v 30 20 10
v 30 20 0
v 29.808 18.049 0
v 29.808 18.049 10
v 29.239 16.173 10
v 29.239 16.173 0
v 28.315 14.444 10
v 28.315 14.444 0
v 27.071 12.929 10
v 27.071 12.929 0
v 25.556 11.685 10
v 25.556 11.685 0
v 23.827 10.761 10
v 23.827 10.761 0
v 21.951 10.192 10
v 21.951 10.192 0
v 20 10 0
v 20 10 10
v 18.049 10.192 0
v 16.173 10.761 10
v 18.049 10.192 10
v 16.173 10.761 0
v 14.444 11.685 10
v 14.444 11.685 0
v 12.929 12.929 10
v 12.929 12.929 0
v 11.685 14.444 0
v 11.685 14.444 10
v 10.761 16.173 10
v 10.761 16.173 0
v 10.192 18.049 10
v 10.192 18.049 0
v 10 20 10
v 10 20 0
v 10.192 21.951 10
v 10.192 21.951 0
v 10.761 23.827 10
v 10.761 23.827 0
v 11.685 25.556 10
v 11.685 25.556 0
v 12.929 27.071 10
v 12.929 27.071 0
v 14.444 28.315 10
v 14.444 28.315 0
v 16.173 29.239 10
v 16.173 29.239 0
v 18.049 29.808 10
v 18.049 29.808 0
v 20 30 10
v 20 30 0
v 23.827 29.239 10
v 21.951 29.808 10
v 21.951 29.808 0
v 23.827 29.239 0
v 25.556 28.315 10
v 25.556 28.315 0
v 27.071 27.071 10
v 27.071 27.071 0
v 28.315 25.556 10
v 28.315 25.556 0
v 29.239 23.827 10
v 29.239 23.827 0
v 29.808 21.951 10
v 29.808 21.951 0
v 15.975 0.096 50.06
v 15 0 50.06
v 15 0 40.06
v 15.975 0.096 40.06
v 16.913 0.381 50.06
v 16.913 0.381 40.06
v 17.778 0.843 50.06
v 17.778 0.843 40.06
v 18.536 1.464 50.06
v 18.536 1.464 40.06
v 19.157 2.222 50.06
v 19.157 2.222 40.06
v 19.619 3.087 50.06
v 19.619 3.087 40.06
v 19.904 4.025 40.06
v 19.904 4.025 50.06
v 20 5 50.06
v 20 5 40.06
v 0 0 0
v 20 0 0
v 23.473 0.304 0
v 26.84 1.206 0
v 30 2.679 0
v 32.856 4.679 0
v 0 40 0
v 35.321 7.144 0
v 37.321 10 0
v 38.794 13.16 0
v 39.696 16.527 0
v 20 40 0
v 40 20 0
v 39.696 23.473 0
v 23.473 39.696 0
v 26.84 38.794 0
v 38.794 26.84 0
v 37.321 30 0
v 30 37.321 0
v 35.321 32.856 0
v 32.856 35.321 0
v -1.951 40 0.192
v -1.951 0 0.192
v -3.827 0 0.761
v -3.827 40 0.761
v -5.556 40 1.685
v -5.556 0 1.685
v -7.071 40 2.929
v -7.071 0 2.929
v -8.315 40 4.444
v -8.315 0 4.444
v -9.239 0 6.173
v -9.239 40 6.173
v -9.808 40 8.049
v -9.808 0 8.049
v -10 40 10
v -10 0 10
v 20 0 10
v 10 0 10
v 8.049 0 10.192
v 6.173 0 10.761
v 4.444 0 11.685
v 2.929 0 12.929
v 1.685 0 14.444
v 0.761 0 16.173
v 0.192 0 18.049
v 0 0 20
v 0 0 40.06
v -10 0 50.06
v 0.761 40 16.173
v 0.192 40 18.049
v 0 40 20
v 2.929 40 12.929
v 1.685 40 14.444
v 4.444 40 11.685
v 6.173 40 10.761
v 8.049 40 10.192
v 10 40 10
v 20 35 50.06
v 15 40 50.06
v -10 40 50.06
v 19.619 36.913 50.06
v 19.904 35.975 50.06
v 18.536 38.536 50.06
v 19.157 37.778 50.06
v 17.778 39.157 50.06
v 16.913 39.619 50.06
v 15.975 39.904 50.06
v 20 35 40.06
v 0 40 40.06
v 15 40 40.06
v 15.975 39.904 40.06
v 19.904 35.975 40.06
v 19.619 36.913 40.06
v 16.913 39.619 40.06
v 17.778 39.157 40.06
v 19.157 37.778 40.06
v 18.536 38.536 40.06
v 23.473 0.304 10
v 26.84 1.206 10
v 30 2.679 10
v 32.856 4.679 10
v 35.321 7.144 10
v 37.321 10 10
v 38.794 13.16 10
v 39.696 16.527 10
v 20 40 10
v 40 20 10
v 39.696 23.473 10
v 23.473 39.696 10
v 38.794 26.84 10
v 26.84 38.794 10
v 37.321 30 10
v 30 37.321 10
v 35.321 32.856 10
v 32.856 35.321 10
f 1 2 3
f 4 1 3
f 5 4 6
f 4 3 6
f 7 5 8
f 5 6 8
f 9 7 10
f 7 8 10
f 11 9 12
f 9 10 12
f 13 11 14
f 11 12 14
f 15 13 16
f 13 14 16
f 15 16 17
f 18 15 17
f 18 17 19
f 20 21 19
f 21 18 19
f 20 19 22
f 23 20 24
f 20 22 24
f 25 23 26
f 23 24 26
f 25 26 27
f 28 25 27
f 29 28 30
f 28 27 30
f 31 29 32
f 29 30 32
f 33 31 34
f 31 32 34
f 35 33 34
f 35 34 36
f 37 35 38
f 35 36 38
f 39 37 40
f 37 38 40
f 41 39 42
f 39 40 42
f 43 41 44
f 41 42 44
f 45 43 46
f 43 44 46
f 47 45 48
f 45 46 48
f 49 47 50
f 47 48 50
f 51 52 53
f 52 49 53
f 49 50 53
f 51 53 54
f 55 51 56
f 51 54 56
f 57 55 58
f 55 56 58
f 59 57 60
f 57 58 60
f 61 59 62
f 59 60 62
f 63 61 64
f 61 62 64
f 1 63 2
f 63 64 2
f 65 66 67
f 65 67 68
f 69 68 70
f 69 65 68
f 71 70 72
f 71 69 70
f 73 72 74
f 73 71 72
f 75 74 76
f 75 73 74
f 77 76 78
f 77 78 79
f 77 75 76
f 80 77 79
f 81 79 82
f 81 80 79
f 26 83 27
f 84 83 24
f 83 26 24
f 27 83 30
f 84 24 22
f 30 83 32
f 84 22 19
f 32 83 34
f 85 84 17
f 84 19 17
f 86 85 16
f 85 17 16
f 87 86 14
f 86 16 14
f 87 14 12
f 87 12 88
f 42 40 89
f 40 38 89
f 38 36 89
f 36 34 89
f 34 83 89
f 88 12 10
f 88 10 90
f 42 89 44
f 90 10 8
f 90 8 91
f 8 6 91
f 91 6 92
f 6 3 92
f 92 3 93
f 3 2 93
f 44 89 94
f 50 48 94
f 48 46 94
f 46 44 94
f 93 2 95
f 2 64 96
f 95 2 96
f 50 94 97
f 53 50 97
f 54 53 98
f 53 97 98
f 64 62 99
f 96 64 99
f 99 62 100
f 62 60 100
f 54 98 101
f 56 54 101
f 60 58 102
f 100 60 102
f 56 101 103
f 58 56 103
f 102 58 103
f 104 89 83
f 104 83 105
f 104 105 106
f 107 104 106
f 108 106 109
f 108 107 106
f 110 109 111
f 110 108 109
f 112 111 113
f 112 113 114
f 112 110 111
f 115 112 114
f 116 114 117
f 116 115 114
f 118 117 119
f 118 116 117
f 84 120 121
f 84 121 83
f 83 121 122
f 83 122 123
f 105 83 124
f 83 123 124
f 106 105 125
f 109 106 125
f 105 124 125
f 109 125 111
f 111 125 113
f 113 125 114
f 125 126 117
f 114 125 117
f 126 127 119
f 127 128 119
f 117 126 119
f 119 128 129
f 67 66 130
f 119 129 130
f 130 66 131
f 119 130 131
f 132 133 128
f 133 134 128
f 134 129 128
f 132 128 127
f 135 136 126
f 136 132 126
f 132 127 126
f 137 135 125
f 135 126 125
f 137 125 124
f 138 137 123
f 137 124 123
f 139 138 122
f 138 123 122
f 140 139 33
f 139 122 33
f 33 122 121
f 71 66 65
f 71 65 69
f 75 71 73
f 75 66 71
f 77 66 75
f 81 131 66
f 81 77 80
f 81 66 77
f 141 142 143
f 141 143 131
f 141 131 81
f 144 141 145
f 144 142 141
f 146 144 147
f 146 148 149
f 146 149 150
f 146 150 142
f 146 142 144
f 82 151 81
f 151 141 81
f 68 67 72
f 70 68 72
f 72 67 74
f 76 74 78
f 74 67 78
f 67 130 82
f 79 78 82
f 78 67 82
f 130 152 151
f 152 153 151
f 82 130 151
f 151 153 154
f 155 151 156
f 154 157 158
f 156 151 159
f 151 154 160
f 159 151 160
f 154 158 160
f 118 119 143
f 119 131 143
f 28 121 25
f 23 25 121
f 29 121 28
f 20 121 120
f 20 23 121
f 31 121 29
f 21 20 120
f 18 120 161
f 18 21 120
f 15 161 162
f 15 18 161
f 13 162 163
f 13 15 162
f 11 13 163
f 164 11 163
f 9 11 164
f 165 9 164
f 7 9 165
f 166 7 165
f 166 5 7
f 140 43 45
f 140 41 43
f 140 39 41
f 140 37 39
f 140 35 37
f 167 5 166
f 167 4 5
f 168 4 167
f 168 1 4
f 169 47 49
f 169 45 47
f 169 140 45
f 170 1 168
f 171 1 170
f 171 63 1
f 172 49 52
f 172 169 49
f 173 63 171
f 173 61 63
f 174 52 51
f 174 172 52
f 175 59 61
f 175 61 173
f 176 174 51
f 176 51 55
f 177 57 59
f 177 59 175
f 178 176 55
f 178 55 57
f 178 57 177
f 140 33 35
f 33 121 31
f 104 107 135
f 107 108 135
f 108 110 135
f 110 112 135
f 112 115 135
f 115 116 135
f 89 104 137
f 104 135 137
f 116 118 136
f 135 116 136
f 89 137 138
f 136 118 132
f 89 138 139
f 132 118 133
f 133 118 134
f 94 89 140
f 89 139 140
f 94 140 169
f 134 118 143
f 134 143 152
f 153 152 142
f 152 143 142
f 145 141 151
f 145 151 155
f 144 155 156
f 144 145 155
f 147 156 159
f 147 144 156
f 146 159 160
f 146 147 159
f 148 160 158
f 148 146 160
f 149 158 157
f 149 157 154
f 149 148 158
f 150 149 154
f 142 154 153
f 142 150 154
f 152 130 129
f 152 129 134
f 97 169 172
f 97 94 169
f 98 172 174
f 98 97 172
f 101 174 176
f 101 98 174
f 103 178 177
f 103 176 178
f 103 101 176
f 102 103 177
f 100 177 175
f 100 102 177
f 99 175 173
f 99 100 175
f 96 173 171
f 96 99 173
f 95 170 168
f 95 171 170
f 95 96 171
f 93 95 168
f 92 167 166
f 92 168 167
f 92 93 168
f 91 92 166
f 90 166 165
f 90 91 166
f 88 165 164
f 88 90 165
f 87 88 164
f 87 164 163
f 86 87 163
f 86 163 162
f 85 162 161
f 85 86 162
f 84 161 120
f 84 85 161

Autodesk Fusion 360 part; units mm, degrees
sketch "Sketch1" plane through (0, 0, 0) normal (0, 0, 1) x (1, 0, 0)
  line L0 (0, 0) -> (20, 0)
  line L1 (20, 40) -> (0, 40)
  line L2 (0, 40) -> (0, 0)
  circle A0 centre (20, 20) radius 10
  arc A1 (20, 0) -> (20, 40) centre (20, 20) ccw
  dimension "d1" = 20
  dimension "d2" = 40
  dimension "d3" = 20
  dimension "d10" = 20
sketch "Sketch2" plane through (0, 0, 0) normal (1, 0, 0) x (0, 1, 0)
  line L0 (0, 0) -> (40, 0)
  line L1 (40, 0) -> (40, 50.06)
  line L2 (40, 50.06) -> (0, 50.06)
  line L3 (0, 50.06) -> (0, 0)
  dimension "d4" = 40
  dimension "d5" = 50.06
ref_plane "WorkPlane1" through (20, 20, 50.06) normal (0, 0, 1) x (1, 0, 0)
sketch "Sketch3" plane through (20, 20, 50.06) normal (0, 0, 1) x (1, 0, 0)
  line L0 (-20, 20) -> (-5, 20)
  line L1 (0, 15) -> (0, -15)
  line L2 (-5, -20) -> (-20, -20)
  line L3 (-20, -20) -> (-20, 20)
  arc A0 (-5, -20) -> (0, -15) centre (-5, -15) ccw
  arc A1 (0, 15) -> (-5, 20) centre (-5, 15) ccw
  point P0 (0, 20)
  dimension "d7" = 20
  dimension "d8" = 40
  dimension "d9" = 5
extrude "Extrude1" add sketch "Sketch1" along normal blind 10
extrude "Extrude2" add sketch "Sketch2" against normal blind 10
extrude "Extrude3" add sketch "Sketch3" against normal blind 10
fillet "Fillet1" radius 10 1 edges at (0, 20, 10)
fillet "Fillet2" radius 10 1 edges at (-10, 20, 0)
